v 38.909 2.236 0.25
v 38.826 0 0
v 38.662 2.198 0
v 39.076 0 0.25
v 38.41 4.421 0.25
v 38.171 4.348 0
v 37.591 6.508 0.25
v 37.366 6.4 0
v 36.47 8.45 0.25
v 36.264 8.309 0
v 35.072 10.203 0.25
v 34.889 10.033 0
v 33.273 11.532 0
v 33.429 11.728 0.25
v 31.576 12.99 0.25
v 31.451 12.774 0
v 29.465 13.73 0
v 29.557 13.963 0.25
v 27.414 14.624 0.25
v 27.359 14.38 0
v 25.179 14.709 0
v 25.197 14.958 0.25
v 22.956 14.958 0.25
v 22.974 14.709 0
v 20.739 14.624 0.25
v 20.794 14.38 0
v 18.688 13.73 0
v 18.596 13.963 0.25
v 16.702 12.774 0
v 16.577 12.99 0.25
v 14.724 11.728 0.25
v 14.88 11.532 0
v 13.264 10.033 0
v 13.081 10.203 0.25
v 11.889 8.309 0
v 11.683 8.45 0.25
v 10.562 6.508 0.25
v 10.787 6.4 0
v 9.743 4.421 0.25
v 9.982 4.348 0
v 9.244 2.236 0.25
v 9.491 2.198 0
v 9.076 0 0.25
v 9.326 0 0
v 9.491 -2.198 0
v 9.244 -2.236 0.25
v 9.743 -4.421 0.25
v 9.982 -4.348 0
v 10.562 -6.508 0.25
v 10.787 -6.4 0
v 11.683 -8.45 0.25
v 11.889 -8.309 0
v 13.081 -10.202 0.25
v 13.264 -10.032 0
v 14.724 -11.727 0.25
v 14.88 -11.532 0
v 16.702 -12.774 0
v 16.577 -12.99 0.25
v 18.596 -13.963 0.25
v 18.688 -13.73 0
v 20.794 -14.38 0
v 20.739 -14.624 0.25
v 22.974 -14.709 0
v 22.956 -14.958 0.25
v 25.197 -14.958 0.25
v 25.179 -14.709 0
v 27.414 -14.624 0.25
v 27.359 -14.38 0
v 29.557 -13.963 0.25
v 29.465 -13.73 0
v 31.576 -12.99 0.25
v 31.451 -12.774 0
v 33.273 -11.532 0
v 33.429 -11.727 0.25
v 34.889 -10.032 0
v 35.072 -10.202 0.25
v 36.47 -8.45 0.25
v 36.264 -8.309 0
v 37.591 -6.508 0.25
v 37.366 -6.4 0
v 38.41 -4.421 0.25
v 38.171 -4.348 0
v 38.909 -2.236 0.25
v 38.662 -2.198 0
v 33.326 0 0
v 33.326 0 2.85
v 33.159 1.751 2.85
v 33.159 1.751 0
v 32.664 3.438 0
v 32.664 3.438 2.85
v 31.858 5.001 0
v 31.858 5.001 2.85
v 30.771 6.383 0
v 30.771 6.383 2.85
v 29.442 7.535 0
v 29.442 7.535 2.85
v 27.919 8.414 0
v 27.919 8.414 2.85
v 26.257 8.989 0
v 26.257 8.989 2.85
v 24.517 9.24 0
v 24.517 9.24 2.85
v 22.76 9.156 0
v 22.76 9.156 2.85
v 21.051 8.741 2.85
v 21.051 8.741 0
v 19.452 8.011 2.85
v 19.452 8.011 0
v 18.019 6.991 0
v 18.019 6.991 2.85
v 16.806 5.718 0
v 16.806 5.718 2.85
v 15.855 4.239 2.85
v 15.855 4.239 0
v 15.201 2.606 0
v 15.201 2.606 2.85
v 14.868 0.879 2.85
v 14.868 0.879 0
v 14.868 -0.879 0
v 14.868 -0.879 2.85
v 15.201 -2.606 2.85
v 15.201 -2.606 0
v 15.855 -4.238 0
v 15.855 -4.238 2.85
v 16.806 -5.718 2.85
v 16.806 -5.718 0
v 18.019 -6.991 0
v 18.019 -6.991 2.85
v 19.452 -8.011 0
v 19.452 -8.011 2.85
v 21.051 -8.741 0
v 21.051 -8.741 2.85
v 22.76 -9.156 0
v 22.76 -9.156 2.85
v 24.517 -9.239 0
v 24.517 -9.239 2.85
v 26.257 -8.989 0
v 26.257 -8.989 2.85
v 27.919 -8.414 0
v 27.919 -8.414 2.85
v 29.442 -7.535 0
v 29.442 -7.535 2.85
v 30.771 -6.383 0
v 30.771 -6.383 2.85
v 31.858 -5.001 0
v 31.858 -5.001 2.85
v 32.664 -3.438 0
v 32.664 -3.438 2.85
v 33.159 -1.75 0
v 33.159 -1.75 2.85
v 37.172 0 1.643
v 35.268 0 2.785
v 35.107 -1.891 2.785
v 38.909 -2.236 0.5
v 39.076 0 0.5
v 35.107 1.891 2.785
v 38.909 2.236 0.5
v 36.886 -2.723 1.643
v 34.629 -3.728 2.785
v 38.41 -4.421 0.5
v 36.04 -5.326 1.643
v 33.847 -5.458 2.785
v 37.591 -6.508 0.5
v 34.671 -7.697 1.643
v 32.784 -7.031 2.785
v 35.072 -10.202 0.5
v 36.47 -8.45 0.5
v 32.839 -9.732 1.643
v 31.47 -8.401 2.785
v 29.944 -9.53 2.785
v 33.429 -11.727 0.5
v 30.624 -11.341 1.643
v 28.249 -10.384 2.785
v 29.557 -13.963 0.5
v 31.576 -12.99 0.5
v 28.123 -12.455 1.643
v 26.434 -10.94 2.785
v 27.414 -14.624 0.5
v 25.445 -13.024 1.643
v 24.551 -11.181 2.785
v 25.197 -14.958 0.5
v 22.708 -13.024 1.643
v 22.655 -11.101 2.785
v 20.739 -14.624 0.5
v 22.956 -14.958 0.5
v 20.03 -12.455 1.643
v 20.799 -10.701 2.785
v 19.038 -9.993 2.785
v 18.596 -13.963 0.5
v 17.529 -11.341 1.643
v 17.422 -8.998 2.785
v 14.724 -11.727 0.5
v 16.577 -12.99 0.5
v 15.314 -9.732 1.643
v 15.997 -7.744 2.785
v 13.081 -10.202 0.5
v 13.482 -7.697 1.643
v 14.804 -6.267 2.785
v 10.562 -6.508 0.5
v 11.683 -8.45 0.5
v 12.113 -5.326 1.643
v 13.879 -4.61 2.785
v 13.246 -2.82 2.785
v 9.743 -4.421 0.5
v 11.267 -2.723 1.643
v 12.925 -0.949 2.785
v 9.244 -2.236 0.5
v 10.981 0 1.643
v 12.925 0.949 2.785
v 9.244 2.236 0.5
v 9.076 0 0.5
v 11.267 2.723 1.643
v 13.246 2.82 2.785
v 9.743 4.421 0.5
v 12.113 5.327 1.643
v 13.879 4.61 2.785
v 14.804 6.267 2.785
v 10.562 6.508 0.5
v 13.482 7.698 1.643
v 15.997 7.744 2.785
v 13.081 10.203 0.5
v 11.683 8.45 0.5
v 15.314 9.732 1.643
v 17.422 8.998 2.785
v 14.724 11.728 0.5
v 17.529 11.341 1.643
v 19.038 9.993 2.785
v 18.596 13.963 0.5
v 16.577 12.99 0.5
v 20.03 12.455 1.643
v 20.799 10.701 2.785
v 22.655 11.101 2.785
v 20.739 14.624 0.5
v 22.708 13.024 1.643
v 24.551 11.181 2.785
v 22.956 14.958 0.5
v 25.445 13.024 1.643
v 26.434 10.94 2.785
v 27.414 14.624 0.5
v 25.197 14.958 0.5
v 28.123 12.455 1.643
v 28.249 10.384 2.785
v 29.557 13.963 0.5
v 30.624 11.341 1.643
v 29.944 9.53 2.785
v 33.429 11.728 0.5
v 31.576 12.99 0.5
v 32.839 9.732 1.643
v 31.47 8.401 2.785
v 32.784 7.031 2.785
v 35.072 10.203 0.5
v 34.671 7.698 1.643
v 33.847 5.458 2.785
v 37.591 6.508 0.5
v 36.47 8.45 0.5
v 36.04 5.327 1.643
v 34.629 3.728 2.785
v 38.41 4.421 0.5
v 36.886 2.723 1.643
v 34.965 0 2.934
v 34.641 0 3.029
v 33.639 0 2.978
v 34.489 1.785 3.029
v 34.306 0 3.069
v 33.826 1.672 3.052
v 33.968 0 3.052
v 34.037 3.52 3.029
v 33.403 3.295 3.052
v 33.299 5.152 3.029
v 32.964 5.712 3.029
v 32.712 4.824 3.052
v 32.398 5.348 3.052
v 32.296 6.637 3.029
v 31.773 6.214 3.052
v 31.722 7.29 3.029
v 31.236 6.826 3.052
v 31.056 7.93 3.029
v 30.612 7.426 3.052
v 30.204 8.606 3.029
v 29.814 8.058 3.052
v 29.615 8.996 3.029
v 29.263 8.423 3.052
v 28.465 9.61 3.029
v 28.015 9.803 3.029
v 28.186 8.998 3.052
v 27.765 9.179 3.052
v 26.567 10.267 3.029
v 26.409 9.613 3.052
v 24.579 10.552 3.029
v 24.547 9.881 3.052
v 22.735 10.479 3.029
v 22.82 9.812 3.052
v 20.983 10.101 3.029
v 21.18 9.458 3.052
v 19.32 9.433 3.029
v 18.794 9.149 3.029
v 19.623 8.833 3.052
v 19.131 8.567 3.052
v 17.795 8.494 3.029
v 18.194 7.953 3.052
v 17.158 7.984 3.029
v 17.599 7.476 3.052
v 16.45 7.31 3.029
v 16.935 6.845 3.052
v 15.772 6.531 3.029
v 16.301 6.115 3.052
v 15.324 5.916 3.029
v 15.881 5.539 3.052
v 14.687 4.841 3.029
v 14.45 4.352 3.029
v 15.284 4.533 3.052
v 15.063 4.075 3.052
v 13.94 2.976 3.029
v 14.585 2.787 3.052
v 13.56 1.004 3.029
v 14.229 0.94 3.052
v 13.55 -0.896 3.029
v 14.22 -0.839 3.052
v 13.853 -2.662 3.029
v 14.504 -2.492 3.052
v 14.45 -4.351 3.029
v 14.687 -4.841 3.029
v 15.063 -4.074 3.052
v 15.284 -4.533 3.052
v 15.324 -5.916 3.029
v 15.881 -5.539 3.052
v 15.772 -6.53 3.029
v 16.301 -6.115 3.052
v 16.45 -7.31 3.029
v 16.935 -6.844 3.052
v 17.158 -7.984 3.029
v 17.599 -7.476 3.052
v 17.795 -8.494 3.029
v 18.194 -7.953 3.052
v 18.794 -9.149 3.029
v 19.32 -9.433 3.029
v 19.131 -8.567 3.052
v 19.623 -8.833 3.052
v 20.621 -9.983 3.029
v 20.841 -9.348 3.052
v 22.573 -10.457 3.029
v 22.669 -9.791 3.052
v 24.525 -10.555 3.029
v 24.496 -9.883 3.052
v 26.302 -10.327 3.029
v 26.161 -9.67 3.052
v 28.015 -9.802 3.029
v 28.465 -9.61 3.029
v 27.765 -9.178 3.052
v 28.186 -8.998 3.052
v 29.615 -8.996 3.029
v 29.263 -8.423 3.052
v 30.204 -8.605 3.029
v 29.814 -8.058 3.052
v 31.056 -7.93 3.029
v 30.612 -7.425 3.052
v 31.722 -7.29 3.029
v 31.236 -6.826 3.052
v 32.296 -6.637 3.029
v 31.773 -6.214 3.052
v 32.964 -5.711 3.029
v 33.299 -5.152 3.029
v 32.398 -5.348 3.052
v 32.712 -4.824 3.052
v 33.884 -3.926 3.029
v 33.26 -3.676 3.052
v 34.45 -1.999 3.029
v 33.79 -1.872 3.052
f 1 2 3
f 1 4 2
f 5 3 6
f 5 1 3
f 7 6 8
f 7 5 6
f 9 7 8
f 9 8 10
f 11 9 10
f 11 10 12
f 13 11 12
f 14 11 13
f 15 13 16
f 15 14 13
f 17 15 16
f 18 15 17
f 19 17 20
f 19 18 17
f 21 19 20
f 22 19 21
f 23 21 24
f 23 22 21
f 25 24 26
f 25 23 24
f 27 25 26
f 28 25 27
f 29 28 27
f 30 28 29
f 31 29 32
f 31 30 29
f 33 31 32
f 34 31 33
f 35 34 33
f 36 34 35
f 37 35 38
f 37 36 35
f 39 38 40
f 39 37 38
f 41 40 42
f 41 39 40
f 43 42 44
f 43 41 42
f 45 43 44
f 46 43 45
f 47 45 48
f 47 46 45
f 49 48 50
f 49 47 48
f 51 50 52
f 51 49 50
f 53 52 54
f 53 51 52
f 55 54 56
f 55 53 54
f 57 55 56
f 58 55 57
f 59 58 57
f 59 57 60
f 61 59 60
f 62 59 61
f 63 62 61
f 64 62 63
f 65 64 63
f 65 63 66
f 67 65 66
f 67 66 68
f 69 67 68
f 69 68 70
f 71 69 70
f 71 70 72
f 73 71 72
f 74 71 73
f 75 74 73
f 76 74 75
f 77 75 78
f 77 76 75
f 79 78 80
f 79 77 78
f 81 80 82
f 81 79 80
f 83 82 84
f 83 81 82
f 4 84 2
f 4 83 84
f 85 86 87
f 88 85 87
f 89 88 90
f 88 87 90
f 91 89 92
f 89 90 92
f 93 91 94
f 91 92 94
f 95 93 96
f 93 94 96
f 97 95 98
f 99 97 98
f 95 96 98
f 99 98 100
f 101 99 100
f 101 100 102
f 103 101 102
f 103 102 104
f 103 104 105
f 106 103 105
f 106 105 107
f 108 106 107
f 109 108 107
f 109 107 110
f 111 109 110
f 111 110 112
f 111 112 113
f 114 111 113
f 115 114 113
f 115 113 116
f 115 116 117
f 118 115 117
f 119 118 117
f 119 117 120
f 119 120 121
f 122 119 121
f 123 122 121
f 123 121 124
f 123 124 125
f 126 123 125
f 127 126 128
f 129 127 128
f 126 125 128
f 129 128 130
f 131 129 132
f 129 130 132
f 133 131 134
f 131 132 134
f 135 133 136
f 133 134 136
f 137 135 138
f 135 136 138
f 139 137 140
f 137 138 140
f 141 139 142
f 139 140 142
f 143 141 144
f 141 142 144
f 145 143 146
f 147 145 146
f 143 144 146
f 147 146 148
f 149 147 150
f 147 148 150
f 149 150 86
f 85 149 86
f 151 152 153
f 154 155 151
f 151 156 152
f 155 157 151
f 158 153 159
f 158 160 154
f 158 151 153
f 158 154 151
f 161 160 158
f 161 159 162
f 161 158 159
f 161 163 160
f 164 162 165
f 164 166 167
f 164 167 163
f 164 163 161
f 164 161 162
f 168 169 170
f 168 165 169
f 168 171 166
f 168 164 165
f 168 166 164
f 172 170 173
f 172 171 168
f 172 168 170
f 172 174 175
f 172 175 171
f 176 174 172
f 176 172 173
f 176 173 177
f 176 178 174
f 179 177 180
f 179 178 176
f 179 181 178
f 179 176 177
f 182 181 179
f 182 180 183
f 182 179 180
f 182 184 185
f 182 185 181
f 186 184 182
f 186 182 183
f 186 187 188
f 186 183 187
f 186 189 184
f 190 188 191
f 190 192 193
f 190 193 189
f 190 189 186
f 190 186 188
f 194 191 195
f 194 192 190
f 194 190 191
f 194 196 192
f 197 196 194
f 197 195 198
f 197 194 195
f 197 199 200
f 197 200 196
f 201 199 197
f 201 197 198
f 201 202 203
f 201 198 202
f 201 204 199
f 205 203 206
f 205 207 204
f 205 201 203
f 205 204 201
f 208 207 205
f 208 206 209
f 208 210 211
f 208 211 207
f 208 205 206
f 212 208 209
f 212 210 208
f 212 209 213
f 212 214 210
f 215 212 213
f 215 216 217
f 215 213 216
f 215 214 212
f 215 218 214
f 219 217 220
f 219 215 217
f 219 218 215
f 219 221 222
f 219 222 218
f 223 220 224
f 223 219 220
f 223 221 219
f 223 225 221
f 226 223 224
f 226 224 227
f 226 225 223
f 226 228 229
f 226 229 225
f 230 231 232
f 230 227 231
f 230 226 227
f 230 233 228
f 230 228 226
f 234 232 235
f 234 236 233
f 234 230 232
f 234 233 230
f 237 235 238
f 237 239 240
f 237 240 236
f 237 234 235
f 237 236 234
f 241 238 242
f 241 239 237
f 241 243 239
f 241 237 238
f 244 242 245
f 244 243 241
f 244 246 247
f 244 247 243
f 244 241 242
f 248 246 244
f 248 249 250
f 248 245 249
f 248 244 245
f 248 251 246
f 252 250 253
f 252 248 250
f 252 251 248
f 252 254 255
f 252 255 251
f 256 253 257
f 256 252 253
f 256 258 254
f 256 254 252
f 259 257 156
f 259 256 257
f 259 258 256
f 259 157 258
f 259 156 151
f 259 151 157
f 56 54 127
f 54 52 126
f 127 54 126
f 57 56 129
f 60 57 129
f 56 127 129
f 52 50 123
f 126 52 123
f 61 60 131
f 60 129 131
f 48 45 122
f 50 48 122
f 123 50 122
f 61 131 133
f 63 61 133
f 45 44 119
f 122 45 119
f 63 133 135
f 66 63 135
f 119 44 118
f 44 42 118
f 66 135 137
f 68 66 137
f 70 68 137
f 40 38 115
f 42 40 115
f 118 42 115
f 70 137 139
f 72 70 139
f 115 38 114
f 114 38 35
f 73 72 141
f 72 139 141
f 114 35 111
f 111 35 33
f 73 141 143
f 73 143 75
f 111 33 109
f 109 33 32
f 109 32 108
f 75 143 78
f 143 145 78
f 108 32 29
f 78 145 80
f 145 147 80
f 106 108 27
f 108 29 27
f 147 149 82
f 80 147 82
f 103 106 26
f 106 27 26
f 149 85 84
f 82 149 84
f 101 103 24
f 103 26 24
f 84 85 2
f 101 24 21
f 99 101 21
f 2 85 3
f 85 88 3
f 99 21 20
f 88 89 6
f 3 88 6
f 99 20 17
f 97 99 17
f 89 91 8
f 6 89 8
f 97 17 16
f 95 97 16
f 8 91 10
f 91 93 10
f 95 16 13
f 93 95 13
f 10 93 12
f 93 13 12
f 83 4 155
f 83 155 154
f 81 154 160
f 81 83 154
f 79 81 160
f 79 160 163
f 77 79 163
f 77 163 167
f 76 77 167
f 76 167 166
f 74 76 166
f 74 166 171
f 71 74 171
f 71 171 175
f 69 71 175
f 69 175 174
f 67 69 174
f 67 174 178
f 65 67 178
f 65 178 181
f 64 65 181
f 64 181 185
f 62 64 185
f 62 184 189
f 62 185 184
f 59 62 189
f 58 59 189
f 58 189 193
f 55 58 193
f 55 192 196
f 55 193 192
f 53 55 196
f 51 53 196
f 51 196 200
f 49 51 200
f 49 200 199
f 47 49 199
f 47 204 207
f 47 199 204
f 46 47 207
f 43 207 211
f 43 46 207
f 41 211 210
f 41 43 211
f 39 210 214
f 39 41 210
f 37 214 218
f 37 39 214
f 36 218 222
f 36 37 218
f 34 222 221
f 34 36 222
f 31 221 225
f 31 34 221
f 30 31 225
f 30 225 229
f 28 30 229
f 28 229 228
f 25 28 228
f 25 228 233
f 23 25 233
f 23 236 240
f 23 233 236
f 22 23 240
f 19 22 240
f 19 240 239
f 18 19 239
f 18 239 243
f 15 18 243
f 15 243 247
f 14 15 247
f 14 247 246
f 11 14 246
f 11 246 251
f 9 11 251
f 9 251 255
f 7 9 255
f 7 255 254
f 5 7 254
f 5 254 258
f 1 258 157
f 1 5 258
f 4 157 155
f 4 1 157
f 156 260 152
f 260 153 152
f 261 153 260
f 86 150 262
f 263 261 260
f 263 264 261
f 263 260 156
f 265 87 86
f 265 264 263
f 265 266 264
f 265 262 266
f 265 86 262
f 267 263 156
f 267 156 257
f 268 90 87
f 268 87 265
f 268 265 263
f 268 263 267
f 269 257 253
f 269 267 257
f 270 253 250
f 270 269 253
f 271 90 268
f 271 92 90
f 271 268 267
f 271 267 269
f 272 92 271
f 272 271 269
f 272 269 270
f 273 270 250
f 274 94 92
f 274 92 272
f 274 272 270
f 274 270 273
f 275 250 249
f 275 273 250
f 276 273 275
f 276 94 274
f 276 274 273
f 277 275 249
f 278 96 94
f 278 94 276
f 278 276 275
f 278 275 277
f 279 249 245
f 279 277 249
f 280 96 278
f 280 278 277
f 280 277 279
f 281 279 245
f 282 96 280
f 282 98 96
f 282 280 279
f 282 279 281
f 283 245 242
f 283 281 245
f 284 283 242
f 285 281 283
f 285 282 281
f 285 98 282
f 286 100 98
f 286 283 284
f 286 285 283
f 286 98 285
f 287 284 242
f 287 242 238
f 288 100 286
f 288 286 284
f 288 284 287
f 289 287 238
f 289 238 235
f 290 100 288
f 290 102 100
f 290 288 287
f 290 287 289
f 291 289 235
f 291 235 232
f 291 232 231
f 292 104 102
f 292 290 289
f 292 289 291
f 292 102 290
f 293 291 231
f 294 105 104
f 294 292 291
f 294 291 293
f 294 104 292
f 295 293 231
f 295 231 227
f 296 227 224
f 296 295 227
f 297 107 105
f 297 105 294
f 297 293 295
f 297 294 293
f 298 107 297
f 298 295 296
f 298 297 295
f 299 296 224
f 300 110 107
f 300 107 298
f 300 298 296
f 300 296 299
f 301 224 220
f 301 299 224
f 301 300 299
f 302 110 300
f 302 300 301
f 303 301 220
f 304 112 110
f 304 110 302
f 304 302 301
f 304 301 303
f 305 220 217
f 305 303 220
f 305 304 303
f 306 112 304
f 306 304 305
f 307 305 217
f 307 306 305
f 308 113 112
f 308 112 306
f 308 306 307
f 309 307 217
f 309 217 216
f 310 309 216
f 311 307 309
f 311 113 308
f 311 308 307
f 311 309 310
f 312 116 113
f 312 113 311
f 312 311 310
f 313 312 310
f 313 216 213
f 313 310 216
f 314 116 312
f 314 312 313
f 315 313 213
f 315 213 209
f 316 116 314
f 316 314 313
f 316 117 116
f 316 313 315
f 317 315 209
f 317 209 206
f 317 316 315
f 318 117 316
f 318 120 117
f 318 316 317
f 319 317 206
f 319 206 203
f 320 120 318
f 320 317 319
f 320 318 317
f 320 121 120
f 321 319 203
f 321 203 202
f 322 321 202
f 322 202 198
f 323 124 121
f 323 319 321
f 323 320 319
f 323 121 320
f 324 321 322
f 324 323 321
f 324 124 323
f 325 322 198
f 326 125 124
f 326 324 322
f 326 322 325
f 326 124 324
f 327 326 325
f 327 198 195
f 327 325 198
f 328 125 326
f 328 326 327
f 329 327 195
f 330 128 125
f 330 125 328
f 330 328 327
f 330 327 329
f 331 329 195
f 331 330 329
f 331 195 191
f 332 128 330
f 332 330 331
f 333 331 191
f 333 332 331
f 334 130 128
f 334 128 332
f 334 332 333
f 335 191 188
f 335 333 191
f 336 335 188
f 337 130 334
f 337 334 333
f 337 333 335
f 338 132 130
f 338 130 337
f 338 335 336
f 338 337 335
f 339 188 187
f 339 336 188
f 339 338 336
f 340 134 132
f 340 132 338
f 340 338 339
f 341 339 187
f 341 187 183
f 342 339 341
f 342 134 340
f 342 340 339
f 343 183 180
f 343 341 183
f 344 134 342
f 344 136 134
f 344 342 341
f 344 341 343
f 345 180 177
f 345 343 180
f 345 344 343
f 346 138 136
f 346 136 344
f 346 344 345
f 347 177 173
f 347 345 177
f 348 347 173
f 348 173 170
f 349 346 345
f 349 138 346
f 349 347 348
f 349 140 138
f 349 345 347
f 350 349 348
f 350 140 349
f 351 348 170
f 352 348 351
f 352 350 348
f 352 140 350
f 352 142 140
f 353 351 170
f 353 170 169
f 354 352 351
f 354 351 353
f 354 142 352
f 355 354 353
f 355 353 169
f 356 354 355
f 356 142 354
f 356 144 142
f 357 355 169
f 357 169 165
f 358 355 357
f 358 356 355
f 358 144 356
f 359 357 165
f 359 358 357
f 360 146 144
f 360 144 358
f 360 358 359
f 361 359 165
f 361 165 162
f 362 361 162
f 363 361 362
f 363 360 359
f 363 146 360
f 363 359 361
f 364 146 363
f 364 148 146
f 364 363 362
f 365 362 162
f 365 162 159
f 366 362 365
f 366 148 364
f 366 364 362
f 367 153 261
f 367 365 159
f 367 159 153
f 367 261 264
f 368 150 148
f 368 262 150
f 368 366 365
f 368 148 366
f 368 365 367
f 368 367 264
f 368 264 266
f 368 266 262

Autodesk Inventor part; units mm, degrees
ref_plane "YZ Plane" through (0, 0, 0) normal (1, 0, 0) x (0, 1, 0)
ref_plane "XZ Plane" through (0, 0, 0) normal (0, 1, 0) x (-1, 0, 0)
ref_plane "XY Plane" through (0, 0, 0) normal (0, 0, 1) x (1, 0, 0)
sketch "Sketch1" plane through (0, 0, 0) normal (0, 0, 1) x (1, 0, 0)
  circle A0 centre (24.0765, 0.0001) radius 15
  point P0 (0, 0)
  dimension "d0" = 30
extrude "Extrusion1" add sketch "Sketch1" along normal blind 3.5
chamfer "Chamfer1" distance 3 distance2 5 1 edges at (9.0765, 0.0001, 3.5) measured on face at (38.8822, -2.4061, 2.3333)
chamfer "Chamfer2" distance 0.25 angle 45 1 edges at (9.0765, 0.0001, 0)
sketch "Sketch2" plane through (24.0765, 0.0001, 3.5) normal (0, 0, 1) x (1, 0, 0)
  circle A0 centre (0, 0) radius 10 projected
  circle A1 centre (0, 0) radius 9.25
  point P0 (-24.0765, -0.0001)
  dimension "d9" = 18.5
extrude "Extrusion2" cut sketch "Sketch2" against normal blind 0.65 contours A1
fillet "Fillet2" radius 2 2 edges at (14.8265, 0.0001, 3.5) (14.0765, 0.0001, 3.5)
sketch "Sketch3" plane through (24.0765, 0.0001, 2.85) normal (0, 0, 1) x (1, 0, 0)
  circle A0 centre (0, 0) radius 9.25 projected
  point P0 (-24.0765, -0.0001)
extrude "Extrusion3" cut sketch "Sketch3" against normal through all
properties part number "objektiv"
